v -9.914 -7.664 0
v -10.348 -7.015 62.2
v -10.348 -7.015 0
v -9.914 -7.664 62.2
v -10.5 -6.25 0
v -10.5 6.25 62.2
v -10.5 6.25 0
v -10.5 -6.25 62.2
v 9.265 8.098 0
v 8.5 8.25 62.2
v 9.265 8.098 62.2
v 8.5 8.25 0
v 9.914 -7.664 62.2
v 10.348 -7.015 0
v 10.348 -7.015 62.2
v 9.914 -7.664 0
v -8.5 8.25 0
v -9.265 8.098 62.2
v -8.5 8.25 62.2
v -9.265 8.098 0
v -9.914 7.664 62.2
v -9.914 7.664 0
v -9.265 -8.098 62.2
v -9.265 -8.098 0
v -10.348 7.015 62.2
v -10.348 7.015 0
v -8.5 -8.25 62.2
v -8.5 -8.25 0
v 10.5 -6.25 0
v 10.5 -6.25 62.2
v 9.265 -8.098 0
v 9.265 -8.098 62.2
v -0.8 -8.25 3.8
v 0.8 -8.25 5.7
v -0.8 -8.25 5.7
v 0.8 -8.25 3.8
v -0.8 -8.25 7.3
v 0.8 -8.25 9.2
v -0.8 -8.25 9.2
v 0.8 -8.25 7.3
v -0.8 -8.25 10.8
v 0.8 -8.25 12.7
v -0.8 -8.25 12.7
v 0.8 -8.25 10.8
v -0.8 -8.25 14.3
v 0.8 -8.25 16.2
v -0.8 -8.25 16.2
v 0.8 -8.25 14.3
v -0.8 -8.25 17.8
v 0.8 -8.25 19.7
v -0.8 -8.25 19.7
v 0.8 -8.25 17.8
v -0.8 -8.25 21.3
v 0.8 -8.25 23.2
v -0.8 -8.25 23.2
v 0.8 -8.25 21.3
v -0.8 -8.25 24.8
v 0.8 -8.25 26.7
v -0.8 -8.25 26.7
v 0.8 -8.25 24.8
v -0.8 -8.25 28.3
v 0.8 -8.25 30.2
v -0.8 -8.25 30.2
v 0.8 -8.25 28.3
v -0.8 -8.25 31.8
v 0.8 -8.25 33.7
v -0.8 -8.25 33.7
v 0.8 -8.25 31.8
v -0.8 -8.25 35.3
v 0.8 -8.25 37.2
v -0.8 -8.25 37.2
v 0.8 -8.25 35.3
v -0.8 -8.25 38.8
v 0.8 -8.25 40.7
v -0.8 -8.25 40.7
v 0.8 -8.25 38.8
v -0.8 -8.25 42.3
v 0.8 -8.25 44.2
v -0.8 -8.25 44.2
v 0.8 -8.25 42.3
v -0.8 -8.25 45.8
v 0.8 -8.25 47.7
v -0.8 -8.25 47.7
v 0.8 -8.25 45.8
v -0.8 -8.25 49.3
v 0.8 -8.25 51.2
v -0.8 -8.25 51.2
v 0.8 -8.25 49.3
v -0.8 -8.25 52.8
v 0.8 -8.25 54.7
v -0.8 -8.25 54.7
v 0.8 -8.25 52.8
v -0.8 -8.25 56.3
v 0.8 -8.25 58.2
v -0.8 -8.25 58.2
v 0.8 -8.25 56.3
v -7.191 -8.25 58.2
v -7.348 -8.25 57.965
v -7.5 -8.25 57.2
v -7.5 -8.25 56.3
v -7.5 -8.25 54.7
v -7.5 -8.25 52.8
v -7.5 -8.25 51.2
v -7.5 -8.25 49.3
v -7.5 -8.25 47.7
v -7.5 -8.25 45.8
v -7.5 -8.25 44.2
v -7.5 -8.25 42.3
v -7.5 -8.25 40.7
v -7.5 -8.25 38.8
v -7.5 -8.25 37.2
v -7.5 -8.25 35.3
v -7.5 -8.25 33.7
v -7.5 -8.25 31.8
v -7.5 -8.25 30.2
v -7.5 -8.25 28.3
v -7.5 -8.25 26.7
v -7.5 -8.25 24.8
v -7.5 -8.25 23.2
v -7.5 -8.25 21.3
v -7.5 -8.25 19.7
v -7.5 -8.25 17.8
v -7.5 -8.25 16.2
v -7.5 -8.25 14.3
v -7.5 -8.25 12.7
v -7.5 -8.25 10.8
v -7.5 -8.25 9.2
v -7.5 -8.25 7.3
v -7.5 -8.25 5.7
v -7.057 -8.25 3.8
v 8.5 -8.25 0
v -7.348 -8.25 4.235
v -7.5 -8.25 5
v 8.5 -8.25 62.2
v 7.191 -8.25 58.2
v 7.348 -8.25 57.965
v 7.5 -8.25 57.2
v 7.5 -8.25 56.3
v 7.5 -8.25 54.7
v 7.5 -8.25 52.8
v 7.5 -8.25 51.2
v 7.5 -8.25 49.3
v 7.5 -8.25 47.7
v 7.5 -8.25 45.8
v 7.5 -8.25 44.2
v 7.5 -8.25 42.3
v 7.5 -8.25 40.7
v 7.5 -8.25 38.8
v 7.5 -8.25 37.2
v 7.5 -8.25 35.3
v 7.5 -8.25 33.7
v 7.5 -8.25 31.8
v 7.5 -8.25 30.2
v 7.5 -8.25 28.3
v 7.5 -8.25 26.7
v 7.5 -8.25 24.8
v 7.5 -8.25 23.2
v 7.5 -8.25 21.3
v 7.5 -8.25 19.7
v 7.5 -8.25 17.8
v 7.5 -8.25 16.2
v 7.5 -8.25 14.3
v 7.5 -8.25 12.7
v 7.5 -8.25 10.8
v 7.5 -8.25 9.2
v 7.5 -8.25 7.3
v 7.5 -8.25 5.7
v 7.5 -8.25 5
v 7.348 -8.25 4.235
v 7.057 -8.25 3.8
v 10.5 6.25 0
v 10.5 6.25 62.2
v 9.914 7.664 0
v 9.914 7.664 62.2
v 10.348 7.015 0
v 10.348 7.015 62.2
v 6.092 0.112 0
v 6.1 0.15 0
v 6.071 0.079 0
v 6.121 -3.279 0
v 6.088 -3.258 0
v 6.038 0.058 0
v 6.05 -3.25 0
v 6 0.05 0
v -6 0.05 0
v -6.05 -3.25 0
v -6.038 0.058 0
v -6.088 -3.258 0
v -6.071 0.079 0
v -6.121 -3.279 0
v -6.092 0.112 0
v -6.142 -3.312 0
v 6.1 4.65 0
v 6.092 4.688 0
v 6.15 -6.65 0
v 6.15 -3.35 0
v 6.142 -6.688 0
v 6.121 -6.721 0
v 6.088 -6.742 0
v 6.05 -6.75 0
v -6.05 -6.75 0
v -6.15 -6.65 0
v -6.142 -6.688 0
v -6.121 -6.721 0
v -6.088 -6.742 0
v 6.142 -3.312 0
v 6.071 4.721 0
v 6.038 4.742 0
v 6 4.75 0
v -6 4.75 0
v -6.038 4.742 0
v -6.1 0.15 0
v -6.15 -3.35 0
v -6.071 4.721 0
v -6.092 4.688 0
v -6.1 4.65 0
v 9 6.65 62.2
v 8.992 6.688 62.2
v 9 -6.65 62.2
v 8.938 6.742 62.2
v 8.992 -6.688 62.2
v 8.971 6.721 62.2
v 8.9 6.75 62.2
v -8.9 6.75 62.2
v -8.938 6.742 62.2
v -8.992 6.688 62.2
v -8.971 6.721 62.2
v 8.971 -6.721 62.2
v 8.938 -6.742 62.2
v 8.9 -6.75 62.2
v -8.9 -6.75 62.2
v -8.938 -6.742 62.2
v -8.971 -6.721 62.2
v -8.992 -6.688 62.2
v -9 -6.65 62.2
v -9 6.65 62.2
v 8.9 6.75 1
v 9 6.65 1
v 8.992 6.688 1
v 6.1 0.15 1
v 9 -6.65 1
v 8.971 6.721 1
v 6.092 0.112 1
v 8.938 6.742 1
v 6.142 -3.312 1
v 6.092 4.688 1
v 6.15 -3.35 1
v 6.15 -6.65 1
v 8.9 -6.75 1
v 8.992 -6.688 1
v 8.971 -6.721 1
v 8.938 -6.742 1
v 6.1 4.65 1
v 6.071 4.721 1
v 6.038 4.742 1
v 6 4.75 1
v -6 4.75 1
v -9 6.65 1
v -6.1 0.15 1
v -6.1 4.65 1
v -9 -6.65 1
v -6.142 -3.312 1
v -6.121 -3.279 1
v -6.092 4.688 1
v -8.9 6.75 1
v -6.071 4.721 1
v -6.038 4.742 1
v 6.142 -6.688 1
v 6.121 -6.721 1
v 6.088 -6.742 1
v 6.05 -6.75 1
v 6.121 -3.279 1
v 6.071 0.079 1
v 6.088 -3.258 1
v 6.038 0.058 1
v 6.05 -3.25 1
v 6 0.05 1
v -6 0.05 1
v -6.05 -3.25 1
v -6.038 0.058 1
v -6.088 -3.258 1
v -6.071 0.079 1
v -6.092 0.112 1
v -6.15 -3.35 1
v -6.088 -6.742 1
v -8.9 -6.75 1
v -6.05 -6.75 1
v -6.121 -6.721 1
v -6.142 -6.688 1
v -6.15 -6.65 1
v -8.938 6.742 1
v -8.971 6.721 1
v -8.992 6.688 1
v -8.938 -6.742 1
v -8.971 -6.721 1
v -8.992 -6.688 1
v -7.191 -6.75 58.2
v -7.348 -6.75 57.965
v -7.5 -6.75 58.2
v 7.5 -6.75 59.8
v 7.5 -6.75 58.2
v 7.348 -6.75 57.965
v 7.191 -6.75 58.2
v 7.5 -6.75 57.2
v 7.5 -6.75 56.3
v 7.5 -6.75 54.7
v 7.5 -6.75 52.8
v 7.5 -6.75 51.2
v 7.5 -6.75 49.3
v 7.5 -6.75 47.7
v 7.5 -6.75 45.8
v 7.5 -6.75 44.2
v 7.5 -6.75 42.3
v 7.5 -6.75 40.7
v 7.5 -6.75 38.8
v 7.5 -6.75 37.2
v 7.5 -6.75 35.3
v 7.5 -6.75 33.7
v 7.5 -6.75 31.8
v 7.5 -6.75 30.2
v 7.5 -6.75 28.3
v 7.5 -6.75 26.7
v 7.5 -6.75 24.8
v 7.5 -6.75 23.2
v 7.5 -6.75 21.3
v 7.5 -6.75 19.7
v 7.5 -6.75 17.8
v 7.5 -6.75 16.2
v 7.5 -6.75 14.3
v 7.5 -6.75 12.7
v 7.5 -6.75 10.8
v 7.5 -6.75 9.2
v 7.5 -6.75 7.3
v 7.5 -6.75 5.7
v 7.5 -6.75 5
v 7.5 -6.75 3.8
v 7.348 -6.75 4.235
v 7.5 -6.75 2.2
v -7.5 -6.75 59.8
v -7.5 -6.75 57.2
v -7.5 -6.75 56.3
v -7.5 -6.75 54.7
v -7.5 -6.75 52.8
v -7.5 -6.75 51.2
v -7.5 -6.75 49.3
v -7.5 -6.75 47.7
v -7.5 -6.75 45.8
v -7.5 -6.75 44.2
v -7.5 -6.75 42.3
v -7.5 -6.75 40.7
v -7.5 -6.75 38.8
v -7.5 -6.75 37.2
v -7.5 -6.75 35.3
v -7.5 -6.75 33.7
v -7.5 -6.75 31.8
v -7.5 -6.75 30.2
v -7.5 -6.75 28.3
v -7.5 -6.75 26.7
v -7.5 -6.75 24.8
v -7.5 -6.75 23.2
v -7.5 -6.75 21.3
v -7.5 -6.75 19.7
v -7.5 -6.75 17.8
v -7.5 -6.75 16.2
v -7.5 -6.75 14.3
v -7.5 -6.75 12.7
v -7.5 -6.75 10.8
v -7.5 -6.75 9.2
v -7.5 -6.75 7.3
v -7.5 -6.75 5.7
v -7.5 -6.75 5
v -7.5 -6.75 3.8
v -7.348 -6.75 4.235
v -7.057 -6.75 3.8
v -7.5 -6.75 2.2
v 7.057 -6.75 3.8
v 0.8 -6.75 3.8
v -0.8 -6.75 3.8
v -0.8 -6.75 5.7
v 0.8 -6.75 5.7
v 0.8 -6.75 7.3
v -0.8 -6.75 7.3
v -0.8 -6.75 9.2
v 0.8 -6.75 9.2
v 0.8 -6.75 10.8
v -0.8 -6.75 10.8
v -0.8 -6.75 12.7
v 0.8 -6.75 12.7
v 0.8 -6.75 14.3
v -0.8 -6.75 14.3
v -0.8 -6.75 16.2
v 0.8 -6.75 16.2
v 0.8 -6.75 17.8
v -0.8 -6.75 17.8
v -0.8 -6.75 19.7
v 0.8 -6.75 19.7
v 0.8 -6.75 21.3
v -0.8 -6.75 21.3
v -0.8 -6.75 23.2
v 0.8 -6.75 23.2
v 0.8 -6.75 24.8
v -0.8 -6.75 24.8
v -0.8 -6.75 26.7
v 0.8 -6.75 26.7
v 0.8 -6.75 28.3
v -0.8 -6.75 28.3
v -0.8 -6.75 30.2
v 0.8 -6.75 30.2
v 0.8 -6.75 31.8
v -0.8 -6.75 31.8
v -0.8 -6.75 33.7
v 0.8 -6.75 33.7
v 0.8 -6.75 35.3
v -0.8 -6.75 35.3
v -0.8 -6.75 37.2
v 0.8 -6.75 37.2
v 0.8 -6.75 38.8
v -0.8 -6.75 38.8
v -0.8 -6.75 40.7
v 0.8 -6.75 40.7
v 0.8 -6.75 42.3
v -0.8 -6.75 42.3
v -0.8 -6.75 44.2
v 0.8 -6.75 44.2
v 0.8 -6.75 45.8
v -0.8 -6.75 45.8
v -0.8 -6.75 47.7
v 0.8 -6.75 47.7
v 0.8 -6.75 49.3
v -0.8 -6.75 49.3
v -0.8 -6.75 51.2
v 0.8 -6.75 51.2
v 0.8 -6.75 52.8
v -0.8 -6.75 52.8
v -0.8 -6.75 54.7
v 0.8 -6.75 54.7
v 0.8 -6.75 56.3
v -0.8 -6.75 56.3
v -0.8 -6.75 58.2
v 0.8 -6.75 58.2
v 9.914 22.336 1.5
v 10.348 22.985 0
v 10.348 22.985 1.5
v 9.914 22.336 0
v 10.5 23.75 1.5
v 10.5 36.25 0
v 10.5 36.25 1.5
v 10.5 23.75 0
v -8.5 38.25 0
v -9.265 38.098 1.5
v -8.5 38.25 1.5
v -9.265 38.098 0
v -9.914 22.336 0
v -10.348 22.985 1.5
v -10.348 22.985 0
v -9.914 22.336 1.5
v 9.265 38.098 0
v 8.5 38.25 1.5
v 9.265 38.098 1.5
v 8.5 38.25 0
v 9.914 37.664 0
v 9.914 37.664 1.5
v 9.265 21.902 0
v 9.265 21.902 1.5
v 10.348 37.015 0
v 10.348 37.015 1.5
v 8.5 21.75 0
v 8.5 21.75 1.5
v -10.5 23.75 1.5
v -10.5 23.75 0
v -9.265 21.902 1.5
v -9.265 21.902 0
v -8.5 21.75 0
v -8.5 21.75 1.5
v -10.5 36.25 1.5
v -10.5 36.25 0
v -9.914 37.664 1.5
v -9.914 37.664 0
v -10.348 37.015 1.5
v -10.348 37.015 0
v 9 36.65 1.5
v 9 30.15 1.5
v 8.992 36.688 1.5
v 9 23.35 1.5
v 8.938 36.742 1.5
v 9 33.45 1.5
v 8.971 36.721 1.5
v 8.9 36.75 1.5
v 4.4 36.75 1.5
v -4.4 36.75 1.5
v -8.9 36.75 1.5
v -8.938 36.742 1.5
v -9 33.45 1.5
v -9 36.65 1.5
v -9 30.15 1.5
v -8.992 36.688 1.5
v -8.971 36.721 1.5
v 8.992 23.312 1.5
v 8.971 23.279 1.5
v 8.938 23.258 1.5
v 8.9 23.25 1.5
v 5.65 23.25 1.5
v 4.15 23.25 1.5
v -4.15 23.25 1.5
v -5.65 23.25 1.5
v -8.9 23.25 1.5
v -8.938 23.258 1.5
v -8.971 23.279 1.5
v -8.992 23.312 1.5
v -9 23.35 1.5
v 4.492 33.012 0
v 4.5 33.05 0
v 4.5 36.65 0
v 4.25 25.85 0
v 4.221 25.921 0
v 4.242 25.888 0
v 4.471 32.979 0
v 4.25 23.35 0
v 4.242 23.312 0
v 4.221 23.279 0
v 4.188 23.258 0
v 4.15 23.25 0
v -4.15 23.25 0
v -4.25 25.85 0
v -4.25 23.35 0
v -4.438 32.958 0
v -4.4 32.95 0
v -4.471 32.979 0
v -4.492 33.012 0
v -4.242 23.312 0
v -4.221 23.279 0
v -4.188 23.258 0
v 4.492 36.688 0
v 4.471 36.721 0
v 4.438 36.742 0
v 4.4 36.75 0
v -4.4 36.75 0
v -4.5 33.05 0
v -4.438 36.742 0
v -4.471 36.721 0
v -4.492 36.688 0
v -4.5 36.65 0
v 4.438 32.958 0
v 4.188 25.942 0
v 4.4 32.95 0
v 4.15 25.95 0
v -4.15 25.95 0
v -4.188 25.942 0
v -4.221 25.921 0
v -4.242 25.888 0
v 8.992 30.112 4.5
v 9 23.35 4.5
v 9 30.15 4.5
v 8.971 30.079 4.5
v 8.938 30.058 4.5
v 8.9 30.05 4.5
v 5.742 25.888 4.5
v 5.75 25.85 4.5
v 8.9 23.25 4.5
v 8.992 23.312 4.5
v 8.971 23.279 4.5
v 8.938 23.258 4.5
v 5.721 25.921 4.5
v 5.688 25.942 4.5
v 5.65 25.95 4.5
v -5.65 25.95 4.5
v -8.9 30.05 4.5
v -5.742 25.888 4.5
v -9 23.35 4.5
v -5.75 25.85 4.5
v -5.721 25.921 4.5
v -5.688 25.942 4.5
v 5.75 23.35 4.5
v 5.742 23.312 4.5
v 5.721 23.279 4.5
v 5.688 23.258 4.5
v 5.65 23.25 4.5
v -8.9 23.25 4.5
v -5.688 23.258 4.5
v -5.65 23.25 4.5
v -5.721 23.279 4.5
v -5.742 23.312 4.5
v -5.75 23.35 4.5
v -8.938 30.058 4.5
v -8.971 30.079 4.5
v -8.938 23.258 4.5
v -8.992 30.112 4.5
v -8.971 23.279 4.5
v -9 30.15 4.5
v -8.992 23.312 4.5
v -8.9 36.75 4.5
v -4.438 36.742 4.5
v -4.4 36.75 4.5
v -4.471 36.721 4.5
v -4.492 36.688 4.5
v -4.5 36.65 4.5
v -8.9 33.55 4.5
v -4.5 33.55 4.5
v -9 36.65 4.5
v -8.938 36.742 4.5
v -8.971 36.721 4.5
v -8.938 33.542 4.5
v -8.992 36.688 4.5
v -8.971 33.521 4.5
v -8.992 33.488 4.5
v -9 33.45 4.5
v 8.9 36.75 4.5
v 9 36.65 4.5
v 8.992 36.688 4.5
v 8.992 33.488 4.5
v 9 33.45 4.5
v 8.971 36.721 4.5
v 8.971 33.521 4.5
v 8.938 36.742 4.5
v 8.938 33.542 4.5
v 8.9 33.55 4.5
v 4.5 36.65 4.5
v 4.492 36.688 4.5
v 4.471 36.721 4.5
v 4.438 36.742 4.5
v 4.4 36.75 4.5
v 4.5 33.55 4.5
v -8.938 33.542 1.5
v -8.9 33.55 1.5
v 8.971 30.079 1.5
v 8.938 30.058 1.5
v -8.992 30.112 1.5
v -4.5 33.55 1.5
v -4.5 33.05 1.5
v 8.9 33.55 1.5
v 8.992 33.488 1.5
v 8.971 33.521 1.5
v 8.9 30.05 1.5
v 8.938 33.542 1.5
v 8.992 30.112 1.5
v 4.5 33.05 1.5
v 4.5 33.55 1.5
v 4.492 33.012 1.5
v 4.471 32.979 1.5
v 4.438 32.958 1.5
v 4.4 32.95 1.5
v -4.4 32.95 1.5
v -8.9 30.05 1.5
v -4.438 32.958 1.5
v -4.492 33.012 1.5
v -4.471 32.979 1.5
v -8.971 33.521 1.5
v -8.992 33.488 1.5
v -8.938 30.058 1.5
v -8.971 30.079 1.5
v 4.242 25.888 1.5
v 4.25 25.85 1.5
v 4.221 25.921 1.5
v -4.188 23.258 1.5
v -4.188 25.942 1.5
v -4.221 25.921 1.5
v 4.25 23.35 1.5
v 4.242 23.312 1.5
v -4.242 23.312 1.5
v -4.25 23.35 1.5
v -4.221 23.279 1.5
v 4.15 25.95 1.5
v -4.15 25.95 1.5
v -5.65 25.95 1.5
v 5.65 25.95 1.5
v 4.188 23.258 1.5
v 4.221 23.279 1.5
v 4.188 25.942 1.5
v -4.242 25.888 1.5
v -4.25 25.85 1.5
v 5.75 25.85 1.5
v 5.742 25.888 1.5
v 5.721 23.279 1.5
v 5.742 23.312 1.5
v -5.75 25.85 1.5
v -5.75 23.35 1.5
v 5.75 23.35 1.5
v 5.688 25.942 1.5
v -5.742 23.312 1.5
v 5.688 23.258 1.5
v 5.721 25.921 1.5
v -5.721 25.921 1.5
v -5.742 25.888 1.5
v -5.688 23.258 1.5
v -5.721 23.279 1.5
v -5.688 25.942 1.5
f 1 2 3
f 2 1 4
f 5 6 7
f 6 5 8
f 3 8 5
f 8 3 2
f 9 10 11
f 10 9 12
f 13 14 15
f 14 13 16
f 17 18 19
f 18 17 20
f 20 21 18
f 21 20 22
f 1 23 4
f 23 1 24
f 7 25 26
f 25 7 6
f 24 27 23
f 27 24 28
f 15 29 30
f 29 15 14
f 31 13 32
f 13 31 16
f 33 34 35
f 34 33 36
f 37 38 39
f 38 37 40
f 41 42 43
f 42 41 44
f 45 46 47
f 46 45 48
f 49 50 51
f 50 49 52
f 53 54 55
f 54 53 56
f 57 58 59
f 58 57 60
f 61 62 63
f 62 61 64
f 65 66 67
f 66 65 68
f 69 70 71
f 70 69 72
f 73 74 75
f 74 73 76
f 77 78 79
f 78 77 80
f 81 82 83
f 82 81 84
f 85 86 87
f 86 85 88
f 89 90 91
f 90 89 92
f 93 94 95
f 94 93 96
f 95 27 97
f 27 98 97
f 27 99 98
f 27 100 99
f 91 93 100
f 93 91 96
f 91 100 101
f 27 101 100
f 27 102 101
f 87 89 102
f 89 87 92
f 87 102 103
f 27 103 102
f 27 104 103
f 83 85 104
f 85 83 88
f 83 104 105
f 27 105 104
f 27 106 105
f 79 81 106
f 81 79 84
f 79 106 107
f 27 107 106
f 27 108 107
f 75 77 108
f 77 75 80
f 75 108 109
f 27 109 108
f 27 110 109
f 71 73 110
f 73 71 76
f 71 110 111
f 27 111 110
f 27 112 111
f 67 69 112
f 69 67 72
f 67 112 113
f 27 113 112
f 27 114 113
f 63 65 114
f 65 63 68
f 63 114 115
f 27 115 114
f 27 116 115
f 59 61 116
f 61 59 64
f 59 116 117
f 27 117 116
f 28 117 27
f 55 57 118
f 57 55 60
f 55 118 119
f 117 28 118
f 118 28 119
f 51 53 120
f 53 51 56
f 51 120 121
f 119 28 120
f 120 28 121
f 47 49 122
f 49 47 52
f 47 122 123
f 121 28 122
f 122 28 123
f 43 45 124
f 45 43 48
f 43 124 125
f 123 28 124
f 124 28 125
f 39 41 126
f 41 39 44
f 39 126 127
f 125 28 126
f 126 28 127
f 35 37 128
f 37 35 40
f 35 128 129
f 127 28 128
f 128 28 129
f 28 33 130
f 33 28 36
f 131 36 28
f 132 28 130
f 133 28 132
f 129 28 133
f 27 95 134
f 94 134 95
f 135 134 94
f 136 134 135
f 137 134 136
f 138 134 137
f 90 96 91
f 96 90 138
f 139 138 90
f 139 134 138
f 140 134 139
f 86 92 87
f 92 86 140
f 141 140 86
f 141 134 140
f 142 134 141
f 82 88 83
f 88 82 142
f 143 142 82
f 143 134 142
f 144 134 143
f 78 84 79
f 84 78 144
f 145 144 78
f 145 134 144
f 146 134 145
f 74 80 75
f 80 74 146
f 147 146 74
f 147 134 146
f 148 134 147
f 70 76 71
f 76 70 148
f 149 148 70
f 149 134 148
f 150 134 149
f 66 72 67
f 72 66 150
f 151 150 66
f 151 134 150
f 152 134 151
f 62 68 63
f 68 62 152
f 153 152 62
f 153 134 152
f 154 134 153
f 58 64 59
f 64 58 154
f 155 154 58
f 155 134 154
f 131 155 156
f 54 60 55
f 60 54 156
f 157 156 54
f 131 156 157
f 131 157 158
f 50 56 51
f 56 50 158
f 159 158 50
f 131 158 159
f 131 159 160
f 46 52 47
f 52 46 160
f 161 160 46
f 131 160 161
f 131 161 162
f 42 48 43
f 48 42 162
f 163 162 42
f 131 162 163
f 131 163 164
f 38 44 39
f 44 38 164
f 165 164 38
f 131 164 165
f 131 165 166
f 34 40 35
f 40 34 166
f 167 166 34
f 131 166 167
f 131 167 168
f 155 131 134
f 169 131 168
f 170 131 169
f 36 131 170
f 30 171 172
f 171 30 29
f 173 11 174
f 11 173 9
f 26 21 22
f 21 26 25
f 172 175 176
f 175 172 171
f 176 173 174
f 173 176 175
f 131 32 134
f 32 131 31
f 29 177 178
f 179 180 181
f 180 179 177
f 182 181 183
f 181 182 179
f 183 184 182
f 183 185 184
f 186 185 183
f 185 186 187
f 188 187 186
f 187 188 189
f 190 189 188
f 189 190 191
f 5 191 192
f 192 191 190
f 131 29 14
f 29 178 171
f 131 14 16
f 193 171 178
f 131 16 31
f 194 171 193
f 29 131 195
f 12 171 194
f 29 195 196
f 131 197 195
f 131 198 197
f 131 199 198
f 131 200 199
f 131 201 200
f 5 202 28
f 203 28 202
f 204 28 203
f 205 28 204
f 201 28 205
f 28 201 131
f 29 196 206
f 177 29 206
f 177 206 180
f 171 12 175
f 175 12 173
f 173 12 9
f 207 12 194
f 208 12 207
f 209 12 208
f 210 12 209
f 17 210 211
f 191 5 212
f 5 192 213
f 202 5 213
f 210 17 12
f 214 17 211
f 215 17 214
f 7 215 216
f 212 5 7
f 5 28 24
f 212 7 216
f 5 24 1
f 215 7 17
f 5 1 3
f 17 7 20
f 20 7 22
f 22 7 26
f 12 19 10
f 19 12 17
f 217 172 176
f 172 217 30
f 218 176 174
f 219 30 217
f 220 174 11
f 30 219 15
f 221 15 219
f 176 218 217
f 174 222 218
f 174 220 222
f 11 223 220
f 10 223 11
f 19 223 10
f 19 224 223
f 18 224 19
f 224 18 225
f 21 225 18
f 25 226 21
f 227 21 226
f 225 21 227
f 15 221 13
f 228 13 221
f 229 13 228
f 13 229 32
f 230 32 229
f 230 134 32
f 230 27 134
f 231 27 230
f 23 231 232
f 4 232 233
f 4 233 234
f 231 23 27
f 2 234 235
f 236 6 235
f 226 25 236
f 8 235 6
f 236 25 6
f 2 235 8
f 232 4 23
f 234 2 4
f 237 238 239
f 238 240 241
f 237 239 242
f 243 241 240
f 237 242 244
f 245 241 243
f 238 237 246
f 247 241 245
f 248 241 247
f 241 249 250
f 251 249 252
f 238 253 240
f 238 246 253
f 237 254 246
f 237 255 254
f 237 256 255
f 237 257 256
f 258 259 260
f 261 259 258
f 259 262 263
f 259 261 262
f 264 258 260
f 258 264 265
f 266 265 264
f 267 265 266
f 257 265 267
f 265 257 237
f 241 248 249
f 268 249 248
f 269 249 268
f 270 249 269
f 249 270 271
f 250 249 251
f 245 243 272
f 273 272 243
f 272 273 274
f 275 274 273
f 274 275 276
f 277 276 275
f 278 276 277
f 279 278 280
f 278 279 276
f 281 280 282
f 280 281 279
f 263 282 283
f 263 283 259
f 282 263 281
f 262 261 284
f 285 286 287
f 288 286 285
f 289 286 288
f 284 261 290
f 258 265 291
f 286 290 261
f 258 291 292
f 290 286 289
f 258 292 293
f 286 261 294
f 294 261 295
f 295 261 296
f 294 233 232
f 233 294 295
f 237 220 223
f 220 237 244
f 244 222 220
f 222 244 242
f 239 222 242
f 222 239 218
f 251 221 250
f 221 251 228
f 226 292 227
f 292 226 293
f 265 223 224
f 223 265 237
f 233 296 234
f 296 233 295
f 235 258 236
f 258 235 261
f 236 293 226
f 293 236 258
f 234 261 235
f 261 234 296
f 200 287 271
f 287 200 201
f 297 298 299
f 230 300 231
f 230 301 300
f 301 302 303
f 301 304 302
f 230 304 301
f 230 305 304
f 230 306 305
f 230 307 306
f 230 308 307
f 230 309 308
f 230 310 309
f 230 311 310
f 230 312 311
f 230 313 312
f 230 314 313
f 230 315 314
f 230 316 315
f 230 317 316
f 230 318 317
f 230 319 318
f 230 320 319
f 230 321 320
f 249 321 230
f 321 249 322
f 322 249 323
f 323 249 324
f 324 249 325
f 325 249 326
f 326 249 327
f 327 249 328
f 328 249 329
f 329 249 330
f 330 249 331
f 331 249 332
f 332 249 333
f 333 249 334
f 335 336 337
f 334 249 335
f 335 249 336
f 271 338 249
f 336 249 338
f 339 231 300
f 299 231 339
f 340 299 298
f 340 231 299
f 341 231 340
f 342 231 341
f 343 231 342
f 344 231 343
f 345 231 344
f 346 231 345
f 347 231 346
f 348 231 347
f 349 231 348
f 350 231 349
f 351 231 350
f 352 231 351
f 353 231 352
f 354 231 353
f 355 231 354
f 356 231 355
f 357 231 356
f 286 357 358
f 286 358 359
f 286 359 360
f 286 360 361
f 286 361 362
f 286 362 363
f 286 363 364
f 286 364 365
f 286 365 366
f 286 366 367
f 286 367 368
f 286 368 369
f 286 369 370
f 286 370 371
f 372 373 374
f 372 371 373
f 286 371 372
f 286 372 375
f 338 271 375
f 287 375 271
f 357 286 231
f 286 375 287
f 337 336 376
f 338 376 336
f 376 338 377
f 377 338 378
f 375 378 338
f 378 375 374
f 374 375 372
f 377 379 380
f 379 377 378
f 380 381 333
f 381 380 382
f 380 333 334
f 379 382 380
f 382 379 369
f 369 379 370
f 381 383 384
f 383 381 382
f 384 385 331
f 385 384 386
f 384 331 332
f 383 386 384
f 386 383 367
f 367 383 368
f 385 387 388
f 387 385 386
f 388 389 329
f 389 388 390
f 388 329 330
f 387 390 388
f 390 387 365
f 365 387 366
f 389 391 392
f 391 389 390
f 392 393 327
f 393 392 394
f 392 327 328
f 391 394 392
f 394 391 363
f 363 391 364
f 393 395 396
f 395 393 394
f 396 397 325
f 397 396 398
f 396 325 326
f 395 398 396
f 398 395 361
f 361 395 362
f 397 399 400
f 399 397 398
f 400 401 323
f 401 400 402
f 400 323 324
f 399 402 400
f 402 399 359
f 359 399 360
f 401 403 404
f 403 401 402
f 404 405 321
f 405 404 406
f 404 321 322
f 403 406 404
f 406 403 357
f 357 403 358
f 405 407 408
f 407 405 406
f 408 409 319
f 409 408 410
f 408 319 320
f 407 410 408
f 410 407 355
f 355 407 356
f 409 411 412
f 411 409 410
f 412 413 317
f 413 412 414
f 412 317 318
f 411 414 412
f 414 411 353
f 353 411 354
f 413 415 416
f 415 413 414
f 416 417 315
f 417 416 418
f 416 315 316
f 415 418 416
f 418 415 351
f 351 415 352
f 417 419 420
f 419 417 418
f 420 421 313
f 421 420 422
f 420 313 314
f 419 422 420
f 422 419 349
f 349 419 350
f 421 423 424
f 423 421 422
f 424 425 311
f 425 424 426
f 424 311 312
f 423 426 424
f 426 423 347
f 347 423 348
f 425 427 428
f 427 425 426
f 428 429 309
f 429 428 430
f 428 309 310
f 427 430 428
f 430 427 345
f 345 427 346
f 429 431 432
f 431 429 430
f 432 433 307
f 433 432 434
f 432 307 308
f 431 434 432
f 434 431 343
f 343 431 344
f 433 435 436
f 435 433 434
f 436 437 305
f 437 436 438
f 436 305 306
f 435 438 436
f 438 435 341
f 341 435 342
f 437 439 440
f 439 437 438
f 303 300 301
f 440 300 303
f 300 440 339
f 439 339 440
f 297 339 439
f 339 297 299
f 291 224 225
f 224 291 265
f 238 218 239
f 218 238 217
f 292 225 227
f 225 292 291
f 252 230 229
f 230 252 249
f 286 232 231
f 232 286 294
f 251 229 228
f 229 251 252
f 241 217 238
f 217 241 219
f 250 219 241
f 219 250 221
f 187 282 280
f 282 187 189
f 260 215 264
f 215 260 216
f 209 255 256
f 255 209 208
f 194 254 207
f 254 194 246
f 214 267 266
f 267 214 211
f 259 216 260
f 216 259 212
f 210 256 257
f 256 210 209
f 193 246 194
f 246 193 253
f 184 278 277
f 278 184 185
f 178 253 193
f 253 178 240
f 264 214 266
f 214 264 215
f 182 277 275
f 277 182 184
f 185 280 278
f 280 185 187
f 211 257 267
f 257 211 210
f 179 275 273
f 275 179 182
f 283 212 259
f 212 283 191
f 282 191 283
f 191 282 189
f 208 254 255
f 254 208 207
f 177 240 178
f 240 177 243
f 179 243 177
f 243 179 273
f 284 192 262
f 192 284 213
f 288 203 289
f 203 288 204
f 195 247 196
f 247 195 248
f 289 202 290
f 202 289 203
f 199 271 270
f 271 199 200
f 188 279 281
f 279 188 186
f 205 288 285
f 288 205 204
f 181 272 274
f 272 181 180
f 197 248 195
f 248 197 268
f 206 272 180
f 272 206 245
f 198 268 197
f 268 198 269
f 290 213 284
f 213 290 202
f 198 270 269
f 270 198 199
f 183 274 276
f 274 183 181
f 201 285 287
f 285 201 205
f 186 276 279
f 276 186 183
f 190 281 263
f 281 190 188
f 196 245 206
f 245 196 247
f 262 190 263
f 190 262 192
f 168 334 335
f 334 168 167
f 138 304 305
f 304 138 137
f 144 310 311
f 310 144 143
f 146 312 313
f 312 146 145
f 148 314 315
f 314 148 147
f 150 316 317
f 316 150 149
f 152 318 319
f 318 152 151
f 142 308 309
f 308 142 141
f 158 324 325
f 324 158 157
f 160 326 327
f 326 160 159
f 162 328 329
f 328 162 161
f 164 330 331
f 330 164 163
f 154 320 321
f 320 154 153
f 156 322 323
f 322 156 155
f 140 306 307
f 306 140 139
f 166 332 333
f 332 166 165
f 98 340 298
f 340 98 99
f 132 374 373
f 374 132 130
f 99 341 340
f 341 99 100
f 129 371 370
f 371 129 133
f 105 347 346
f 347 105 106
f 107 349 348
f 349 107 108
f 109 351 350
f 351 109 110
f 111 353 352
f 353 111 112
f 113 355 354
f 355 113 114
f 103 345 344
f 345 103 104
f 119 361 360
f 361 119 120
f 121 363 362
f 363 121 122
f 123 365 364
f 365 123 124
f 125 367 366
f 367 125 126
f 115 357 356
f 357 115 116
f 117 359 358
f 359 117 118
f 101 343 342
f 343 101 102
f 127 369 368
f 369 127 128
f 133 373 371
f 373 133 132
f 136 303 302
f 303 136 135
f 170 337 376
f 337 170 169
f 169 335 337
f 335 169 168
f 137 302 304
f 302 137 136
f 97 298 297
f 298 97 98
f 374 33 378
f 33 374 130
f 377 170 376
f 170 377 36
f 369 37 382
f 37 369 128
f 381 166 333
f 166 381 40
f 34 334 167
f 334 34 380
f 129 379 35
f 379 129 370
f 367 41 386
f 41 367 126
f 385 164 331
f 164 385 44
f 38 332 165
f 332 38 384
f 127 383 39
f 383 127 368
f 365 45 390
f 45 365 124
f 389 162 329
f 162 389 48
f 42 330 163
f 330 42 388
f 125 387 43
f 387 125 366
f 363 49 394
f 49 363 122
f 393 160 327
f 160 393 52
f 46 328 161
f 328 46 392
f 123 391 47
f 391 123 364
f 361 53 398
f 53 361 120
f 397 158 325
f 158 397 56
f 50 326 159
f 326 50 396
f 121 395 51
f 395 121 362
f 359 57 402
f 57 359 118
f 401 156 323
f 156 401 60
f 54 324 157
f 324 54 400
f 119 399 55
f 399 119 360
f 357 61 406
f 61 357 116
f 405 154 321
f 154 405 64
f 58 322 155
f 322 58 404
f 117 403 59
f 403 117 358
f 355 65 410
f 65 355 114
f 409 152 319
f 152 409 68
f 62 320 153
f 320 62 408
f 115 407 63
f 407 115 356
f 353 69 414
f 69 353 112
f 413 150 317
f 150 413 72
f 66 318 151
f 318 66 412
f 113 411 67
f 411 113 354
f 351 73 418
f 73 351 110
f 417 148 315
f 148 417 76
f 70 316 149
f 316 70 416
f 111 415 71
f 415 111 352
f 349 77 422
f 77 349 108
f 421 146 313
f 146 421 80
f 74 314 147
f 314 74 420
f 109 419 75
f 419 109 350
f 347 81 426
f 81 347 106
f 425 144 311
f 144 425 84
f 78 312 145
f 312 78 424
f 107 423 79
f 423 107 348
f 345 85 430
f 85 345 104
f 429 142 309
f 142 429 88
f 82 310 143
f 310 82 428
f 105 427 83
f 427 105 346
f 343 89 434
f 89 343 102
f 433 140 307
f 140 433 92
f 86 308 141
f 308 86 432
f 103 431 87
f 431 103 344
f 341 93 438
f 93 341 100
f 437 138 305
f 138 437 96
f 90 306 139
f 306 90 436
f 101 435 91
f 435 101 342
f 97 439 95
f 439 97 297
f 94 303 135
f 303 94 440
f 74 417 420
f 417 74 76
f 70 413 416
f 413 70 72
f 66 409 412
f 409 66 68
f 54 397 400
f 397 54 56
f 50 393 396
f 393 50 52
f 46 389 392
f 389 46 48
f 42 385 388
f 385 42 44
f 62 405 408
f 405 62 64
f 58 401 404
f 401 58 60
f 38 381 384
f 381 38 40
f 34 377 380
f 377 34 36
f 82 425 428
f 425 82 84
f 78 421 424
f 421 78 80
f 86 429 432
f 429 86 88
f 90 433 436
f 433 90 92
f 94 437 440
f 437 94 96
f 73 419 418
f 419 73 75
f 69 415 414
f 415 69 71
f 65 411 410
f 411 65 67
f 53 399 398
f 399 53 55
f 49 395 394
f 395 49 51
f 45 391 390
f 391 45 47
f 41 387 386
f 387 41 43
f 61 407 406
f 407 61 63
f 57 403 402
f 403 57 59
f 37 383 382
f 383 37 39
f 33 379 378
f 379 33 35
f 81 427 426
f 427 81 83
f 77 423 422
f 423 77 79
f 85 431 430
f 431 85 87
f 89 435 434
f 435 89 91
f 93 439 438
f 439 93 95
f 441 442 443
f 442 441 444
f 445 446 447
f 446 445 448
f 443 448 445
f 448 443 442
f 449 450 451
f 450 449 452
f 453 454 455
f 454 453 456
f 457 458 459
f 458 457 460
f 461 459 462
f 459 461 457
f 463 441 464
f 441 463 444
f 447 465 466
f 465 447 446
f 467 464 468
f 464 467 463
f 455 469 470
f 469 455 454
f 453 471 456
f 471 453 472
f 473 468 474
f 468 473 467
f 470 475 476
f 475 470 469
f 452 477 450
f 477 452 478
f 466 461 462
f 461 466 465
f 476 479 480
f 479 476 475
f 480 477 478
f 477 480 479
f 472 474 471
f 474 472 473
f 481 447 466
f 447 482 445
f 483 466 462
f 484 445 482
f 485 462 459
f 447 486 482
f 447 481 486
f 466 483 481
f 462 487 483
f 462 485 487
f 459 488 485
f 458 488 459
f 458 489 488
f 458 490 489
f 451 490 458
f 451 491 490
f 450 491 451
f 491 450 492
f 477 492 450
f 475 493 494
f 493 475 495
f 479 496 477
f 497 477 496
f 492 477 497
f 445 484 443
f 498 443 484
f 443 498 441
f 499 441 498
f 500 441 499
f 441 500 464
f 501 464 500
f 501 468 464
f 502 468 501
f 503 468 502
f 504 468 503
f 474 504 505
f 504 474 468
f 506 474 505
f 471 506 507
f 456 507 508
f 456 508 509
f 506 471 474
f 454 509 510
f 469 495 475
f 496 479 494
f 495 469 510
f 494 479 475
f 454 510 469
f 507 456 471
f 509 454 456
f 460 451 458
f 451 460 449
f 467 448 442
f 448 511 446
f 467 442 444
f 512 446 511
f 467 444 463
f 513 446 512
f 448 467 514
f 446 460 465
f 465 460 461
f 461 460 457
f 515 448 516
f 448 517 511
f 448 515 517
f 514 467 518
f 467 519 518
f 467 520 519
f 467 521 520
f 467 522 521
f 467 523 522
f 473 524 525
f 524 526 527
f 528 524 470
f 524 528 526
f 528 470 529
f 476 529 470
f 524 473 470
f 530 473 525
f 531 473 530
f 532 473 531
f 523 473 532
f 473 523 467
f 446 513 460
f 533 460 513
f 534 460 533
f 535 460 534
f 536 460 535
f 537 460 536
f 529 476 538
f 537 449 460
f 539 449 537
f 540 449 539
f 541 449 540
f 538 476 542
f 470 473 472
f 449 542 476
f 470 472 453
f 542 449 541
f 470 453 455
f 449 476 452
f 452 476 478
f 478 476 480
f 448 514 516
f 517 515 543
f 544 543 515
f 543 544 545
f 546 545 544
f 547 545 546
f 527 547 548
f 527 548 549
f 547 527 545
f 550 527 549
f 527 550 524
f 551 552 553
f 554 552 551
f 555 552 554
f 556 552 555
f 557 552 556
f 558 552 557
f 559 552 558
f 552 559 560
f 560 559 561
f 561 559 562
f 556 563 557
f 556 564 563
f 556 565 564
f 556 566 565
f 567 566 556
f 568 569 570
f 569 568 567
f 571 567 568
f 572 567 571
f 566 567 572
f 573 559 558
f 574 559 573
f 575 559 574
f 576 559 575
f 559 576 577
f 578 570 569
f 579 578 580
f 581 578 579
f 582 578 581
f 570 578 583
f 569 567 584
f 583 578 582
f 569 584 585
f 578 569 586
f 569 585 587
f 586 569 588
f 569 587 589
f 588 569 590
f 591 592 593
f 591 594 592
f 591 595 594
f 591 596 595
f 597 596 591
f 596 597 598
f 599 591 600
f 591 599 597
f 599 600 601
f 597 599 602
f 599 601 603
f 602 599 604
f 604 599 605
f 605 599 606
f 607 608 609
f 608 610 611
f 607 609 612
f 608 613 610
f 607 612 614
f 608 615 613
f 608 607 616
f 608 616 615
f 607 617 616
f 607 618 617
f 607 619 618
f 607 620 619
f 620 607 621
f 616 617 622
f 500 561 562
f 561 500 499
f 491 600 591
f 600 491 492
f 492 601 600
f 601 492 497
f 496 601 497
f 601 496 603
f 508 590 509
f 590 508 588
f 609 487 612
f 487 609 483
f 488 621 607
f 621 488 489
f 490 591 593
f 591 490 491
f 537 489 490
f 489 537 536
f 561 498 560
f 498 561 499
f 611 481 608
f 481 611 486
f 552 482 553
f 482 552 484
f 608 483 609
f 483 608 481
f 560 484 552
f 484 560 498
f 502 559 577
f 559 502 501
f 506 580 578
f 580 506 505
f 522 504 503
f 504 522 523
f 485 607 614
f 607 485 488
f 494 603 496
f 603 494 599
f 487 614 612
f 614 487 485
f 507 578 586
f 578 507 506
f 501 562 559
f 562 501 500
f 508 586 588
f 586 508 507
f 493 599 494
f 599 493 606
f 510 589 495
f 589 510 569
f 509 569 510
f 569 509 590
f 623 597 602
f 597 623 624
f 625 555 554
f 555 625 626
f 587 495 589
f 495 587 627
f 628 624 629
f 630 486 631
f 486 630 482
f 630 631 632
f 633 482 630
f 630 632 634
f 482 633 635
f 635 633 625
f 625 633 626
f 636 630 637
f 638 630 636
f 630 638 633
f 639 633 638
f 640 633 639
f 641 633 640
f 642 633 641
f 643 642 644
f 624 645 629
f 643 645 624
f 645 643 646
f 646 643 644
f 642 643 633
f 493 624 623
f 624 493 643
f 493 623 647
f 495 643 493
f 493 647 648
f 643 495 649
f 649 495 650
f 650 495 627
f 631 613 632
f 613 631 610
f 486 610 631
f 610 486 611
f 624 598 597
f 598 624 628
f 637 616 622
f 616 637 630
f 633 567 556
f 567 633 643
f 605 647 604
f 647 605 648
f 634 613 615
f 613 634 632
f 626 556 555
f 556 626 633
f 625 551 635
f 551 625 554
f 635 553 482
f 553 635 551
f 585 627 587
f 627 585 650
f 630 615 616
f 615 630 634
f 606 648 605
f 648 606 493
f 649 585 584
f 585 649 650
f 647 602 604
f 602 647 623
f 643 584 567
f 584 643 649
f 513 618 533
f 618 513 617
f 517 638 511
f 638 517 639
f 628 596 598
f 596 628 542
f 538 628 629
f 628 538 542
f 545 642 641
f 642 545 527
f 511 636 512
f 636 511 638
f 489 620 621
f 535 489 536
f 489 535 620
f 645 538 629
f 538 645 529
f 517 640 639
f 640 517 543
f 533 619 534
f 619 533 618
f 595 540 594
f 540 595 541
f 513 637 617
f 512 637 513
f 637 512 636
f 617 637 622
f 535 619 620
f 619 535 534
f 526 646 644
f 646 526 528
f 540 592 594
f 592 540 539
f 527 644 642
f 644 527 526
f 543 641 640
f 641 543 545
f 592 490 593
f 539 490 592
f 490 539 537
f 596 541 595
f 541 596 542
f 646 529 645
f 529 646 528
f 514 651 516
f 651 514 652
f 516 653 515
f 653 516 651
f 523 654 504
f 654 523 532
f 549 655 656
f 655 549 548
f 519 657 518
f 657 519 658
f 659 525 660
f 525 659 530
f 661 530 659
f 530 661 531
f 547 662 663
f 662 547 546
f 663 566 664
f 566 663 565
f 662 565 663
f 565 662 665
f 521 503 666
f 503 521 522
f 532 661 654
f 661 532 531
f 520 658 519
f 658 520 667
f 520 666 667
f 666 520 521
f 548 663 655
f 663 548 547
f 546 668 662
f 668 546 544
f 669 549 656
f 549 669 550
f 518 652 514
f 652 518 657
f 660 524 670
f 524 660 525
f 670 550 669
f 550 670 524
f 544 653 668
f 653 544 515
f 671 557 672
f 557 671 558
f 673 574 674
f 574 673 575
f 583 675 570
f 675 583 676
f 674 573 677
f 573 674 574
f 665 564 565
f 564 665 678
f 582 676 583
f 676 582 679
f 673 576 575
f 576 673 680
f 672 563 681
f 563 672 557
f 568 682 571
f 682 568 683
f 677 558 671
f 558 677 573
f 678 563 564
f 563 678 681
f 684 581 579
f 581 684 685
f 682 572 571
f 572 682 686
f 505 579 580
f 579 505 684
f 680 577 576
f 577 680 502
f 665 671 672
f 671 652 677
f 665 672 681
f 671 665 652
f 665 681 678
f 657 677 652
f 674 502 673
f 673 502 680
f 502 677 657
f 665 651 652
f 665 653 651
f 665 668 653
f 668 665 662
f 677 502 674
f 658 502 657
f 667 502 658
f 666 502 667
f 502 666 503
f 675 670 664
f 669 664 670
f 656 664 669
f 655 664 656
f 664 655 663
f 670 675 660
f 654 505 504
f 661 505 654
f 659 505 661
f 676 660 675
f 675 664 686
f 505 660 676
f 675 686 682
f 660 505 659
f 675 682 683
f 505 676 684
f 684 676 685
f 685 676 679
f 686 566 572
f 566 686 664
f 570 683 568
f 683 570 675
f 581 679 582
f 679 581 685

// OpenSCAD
wC=18;  // width oft the combined connectors
dC=61.2; //depth of the combined connectors
hC=13.5; //height of the cobined connectors

wE=10; //width of the rj45 connector
hE=5; //height of the rj45 connector

wT=1.5;  //wall thickness
btmT=1;

wI=wC; //width inside
wO=wI+wT*2; //width outside

dI=dC;  //depth inside
dO=dI+btmT; //depth outside

hI=hC;  //height inside
hO=hI+wT*2; //height outside

wU=12.2;  //width of the usb-c connector
hU=4.7;  //height of the usc-c connector
uOff=2;

wS=12.3;  //width of the usb-c connector
hS=3.5;  //height of the usc-c connector
sOff=0;

eR=2; //edge radius
t=0; //tolerance of the lid
lD=3; //depth of the lid

grillT=1.6;
grillS=3.5;
grillW=wC-wT*2;
grillH=dC-5;

base();
translate([0,30,wT+dO])rotate([0,180,0])lid();

module lid(){
  translate([0,0,dO]){  
    difference(){
      union(){
        rcube([wO,hO,wT],eR);
        translate([0,0,-lD])rcube([wI-t,hI-t,lD],0.1);
      }
      tD=3.5;
      tUD=3.2;
      tUW=9;
      ucWA=8.5;
      ucWB=11.5;
      ucD=2.7;
      translate([0,hC/2-tD/2-tUD,-lD])rcube([wI,tD,lD],0.1);
      translate([0,hC/2-tUD/2-0.3,-6])rcube([tUW,tUD+0.6,12],0.1);
      
      translate([0,-(hC/2-ucD/2),-6])rcube([ucWA,ucD,10],0.1);
      translate([0,-(hC/2-ucD/2),-lD])rcube([ucWB,ucD,lD],0.1);
    }
  }
}

module base(){
  difference(){
    rcube([wO,hO,dO],eR);
    translate([0,0,btmT])rcube([wI,hI,dI+1],0.1);
    translate([0,hI/2-hU/2-uOff,-1])rcube([wU,hU,wT+2],0.1);
    translate([0,-(hI/2-hS/2-sOff),-1])rcube([wS,hS,wT+2],0.1);
    translate([0,wT*2-(hC/2+2),dO/2])rotate([90,0,0])rcube([grillW,grillH,wT*2],eR);
    }
   for(i= [0 : grillS: grillH]){
    translate([-grillW/2,-(hC/2)-wT,dO/2-grillH/2+i-grillT/2])cube([grillW,wT,grillT]);
   }
   translate([-grillT/2,-(hC/2)-wT,dO/2-grillH/2])cube([grillT,wT,grillH]);
}




module rcube(size,radius){
  $fn=16;
linear_extrude(height=size[2])
if(radius>0){
hull()
{
    // place 4 circles in the corners, with the given radius
    translate([(-size[0]/2)+(radius), (-size[1]/2)+(radius), 0])
    circle(r=radius);

    translate([(size[0]/2)-(radius), (-size[1]/2)+(radius), 0])
    circle(r=radius);

    translate([(-size[0]/2)+(radius), (size[1]/2)-(radius), 0])
    circle(r=radius);

    translate([(size[0]/2)-(radius), (size[1]/2)-(radius), 0])
    circle(r=radius);
}
}
if(radius==0){
translate([0,0,size[2]/2])cube(size,center=true);
}
}
